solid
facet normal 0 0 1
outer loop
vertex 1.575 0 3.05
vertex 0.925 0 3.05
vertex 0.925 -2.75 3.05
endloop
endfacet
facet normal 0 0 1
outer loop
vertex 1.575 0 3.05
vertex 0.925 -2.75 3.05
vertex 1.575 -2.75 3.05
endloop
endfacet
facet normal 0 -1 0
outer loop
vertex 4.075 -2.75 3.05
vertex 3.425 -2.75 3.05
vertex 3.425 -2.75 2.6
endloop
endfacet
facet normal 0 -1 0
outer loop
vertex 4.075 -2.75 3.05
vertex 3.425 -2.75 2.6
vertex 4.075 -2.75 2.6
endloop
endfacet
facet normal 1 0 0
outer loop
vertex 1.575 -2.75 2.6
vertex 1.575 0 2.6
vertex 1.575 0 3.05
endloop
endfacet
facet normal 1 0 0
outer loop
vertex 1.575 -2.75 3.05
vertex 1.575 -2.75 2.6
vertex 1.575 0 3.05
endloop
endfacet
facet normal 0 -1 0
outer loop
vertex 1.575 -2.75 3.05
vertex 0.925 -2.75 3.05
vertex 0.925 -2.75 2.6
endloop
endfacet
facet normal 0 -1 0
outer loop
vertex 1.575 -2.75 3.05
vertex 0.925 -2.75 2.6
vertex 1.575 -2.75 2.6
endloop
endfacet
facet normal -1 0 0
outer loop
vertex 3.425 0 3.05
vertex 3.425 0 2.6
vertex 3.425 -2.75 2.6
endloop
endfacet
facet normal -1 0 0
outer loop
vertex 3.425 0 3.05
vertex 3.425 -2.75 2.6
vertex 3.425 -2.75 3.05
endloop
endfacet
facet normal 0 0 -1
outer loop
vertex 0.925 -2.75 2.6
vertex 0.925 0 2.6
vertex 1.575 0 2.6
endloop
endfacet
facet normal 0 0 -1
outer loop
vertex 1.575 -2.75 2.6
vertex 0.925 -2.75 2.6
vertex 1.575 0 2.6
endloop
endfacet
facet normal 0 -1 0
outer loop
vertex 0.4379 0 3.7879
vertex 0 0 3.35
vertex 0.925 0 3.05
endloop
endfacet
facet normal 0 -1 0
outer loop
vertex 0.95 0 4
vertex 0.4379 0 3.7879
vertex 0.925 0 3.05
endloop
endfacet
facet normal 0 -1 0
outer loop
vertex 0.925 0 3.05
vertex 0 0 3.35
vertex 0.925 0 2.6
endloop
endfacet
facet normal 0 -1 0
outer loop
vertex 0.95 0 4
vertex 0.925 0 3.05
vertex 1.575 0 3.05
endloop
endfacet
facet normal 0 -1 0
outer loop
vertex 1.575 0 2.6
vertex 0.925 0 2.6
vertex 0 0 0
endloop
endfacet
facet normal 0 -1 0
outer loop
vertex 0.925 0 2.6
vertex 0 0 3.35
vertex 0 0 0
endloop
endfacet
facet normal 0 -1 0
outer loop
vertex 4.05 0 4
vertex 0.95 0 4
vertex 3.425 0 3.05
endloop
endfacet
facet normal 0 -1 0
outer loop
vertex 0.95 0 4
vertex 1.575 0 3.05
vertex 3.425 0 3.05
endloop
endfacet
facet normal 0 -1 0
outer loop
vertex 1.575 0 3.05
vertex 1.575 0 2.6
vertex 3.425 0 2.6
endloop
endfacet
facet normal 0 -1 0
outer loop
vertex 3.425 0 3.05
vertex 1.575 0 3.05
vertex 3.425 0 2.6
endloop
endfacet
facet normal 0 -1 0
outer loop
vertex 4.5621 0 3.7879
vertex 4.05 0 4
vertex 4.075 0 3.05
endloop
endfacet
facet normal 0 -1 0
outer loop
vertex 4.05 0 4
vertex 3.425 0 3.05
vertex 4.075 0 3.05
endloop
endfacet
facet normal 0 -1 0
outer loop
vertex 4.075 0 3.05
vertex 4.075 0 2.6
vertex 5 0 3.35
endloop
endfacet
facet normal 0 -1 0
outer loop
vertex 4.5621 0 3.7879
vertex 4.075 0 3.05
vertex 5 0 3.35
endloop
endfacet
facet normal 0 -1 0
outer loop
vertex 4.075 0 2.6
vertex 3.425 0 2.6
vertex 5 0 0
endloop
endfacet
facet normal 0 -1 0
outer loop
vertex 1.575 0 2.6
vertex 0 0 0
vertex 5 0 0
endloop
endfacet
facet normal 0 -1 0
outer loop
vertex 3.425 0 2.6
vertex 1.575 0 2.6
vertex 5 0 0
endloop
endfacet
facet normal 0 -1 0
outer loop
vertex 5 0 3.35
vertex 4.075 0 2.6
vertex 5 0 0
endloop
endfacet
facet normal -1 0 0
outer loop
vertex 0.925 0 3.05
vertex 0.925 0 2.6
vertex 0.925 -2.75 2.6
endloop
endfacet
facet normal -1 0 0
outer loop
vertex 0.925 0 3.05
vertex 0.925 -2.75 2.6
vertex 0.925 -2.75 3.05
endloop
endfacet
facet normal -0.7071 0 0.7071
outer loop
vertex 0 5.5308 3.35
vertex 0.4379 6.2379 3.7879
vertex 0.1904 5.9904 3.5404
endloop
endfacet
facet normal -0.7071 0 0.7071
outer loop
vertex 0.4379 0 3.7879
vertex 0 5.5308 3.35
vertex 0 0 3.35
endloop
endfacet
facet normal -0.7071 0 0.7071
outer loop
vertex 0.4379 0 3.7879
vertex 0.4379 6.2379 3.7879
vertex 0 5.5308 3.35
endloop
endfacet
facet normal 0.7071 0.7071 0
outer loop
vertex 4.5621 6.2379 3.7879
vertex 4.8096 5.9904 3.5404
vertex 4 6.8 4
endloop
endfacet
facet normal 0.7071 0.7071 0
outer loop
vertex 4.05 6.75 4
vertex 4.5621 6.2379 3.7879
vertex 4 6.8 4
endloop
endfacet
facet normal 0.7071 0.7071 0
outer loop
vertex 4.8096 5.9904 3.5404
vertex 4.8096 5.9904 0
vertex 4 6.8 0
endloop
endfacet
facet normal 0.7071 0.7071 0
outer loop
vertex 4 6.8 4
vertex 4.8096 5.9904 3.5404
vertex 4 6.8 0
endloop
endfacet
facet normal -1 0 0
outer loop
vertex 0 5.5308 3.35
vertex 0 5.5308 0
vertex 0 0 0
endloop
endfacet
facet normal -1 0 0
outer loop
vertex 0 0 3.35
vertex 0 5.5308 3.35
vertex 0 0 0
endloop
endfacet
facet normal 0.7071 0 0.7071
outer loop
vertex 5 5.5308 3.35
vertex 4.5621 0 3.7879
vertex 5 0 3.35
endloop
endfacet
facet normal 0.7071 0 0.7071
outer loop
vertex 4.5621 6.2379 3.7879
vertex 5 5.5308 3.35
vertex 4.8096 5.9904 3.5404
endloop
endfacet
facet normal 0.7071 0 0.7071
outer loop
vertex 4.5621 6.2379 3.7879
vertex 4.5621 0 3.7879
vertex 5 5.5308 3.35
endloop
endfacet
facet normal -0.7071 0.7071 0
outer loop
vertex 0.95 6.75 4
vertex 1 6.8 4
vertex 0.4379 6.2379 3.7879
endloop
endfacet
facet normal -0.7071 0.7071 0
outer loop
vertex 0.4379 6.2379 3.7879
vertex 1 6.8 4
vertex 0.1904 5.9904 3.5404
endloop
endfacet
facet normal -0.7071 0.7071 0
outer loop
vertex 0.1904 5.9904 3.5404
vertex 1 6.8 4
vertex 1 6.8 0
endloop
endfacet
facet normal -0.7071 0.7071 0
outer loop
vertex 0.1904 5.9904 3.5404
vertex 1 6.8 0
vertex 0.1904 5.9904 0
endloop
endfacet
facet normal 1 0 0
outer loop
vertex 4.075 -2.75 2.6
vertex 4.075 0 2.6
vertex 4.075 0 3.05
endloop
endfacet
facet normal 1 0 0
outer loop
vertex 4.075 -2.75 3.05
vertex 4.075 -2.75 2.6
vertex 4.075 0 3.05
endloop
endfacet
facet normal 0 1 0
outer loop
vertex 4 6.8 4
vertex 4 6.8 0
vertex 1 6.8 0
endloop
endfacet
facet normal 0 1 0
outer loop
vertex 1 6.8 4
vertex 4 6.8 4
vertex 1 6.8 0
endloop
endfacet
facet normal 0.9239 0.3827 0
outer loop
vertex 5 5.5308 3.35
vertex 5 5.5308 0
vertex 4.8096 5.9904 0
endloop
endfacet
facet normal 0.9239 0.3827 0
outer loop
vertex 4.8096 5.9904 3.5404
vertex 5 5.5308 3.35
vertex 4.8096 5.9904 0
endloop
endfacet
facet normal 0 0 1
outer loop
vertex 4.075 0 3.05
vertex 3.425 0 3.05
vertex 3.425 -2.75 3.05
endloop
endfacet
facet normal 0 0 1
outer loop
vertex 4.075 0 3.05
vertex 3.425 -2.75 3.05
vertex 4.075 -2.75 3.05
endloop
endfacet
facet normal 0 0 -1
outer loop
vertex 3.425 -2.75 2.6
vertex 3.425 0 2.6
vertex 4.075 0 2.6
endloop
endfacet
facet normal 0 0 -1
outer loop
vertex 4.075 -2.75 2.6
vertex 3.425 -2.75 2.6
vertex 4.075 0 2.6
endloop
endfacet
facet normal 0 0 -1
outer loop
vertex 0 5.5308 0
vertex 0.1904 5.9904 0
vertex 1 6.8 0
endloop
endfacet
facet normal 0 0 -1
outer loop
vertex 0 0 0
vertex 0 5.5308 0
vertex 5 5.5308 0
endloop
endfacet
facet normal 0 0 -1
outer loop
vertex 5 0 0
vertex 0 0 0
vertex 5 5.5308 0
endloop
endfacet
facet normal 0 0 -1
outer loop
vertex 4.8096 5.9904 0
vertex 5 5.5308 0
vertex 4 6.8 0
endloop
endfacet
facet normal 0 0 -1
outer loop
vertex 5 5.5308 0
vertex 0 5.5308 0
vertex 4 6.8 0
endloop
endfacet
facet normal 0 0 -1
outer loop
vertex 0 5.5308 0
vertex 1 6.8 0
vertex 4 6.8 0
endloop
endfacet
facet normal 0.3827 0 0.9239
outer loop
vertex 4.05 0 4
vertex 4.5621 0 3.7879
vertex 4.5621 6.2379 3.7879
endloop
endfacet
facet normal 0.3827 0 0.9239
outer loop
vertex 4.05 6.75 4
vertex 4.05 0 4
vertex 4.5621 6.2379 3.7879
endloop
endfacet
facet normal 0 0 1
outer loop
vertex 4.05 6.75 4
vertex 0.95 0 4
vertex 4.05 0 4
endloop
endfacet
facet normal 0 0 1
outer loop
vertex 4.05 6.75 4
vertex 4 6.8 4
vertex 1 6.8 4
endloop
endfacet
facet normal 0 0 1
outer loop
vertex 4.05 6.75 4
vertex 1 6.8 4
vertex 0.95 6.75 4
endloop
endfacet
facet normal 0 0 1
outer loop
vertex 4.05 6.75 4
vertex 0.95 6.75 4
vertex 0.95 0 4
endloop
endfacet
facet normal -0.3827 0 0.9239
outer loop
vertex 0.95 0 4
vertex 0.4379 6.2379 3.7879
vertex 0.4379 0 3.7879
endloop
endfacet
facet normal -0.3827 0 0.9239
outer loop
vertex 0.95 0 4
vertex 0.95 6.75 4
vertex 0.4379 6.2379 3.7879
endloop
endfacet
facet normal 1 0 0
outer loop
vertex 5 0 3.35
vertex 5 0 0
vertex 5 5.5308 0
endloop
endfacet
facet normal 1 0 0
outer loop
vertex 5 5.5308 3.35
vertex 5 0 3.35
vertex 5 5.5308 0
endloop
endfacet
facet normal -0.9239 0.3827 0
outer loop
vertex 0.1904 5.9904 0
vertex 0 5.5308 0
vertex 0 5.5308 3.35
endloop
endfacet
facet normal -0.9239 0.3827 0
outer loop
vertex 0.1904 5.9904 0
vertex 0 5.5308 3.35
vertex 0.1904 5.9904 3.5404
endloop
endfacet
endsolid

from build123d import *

# Parameters (mm, degrees)
Y_KSEKLIK_EKSTR_ZYON1_DEPTH = 4
PAH2_SIZE                   = 0.65
PAH7_SIZE                   = 0.3
PAH8_SIZE                   = 0.3
IZIM2_W                     = 0.65
IZIM2_H                     = 0.45
Y_KSEKLIK_EKSTR_ZYON2_DEPTH = 2.75


with BuildPart() as part:
    # Çizim1 → Yükseklik-Ekstrüzyon1 (new body)
    with BuildSketch(Plane.XY):
        Polygon((0, 0), (5, 0), (5, 5.8), (4, 6.8), (1, 6.8), (0, 5.8), align=None)
    extrude(amount=Y_KSEKLIK_EKSTR_ZYON1_DEPTH)

    # Pah2
    pah2_edges = [part.edges().sort_by_distance(p)[0] for p in [
        (5, 2.9, 4),
        (0, 2.9, 4),
    ]]
    chamfer(pah2_edges, length=PAH2_SIZE)

    # Pah3
    # the kernel refuses this chamfer: 0.65 mm, written as the material it takes off along each edge
    with BuildSketch(Plane(origin=(0, 5.8, -0.733571059), x_dir=(-0.033908675640741216, -0.9994249355085608, 0), z_dir=(0, 0, 1))) as pah3_piece_1:
        with BuildLine():
            Line((0.293428424, 0), (-0.221071103, 0.192945089))
            Line((-0.221071103, 0.192945089), (-0.229946503, 0.183446285))
            ThreePointArc((-0.229946503, 0.183446285), (-0.116014483, 0.090608776), (-0.0088754, -0.009498804))
            Line((-0.0088754, -0.009498804), (0.000440813, -0.012992524))
            ThreePointArc((0.000440813, -0.012992524), (0.146986333, -0.0080205), (0.293869236, -0.012992524))
            Line((0.293869236, -0.012992524), (0.293428424, 0))
        make_face()
    extrude(amount=4.817142118, mode=Mode.SUBTRACT)

    # Pah4
    # the kernel refuses this chamfer: 0.65 mm, written as the material it takes off along each edge
    with BuildSketch(Plane(origin=(5, 5.8, -0.733571059), x_dir=(0.03390867564074173, -0.9994249355085608, 0), z_dir=(0, 0, 1))) as pah4_piece_1:
        with BuildLine():
            Line((0.293428424, 0), (-0.221071103, -0.192945089))
            Line((-0.221071103, -0.192945089), (-0.229946503, -0.183446285))
            ThreePointArc((-0.229946503, -0.183446285), (-0.116014483, -0.090608776), (-0.0088754, 0.009498804))
            Line((-0.0088754, 0.009498804), (0.000440813, 0.012992524))
            ThreePointArc((0.000440813, 0.012992524), (0.146986333, 0.0080205), (0.293869236, 0.012992524))
            Line((0.293869236, 0.012992524), (0.293428424, 0))
        make_face()
    extrude(amount=4.817142118, mode=Mode.SUBTRACT)

    # Pah7
    pah7_edges = [part.edges().sort_by_distance(p)[0] for p in [
        (0.65, 3.225, 4),
    ]]
    chamfer(pah7_edges, length=PAH7_SIZE)

    # Pah8
    pah8_edges = [part.edges().sort_by_distance(p)[0] for p in [
        (4.35, 3.225, 4),
    ]]
    chamfer(pah8_edges, length=PAH8_SIZE)

    # Çizim2 → Yükseklik-Ekstrüzyon2 (add)
    with BuildSketch(Plane.XZ):
        with Locations((1.25, 2.825)):
            Rectangle(IZIM2_W, IZIM2_H)
        with Locations((3.75, 2.825)):
            Rectangle(IZIM2_W, IZIM2_H)
    extrude(amount=Y_KSEKLIK_EKSTR_ZYON2_DEPTH)


solid = part.part
